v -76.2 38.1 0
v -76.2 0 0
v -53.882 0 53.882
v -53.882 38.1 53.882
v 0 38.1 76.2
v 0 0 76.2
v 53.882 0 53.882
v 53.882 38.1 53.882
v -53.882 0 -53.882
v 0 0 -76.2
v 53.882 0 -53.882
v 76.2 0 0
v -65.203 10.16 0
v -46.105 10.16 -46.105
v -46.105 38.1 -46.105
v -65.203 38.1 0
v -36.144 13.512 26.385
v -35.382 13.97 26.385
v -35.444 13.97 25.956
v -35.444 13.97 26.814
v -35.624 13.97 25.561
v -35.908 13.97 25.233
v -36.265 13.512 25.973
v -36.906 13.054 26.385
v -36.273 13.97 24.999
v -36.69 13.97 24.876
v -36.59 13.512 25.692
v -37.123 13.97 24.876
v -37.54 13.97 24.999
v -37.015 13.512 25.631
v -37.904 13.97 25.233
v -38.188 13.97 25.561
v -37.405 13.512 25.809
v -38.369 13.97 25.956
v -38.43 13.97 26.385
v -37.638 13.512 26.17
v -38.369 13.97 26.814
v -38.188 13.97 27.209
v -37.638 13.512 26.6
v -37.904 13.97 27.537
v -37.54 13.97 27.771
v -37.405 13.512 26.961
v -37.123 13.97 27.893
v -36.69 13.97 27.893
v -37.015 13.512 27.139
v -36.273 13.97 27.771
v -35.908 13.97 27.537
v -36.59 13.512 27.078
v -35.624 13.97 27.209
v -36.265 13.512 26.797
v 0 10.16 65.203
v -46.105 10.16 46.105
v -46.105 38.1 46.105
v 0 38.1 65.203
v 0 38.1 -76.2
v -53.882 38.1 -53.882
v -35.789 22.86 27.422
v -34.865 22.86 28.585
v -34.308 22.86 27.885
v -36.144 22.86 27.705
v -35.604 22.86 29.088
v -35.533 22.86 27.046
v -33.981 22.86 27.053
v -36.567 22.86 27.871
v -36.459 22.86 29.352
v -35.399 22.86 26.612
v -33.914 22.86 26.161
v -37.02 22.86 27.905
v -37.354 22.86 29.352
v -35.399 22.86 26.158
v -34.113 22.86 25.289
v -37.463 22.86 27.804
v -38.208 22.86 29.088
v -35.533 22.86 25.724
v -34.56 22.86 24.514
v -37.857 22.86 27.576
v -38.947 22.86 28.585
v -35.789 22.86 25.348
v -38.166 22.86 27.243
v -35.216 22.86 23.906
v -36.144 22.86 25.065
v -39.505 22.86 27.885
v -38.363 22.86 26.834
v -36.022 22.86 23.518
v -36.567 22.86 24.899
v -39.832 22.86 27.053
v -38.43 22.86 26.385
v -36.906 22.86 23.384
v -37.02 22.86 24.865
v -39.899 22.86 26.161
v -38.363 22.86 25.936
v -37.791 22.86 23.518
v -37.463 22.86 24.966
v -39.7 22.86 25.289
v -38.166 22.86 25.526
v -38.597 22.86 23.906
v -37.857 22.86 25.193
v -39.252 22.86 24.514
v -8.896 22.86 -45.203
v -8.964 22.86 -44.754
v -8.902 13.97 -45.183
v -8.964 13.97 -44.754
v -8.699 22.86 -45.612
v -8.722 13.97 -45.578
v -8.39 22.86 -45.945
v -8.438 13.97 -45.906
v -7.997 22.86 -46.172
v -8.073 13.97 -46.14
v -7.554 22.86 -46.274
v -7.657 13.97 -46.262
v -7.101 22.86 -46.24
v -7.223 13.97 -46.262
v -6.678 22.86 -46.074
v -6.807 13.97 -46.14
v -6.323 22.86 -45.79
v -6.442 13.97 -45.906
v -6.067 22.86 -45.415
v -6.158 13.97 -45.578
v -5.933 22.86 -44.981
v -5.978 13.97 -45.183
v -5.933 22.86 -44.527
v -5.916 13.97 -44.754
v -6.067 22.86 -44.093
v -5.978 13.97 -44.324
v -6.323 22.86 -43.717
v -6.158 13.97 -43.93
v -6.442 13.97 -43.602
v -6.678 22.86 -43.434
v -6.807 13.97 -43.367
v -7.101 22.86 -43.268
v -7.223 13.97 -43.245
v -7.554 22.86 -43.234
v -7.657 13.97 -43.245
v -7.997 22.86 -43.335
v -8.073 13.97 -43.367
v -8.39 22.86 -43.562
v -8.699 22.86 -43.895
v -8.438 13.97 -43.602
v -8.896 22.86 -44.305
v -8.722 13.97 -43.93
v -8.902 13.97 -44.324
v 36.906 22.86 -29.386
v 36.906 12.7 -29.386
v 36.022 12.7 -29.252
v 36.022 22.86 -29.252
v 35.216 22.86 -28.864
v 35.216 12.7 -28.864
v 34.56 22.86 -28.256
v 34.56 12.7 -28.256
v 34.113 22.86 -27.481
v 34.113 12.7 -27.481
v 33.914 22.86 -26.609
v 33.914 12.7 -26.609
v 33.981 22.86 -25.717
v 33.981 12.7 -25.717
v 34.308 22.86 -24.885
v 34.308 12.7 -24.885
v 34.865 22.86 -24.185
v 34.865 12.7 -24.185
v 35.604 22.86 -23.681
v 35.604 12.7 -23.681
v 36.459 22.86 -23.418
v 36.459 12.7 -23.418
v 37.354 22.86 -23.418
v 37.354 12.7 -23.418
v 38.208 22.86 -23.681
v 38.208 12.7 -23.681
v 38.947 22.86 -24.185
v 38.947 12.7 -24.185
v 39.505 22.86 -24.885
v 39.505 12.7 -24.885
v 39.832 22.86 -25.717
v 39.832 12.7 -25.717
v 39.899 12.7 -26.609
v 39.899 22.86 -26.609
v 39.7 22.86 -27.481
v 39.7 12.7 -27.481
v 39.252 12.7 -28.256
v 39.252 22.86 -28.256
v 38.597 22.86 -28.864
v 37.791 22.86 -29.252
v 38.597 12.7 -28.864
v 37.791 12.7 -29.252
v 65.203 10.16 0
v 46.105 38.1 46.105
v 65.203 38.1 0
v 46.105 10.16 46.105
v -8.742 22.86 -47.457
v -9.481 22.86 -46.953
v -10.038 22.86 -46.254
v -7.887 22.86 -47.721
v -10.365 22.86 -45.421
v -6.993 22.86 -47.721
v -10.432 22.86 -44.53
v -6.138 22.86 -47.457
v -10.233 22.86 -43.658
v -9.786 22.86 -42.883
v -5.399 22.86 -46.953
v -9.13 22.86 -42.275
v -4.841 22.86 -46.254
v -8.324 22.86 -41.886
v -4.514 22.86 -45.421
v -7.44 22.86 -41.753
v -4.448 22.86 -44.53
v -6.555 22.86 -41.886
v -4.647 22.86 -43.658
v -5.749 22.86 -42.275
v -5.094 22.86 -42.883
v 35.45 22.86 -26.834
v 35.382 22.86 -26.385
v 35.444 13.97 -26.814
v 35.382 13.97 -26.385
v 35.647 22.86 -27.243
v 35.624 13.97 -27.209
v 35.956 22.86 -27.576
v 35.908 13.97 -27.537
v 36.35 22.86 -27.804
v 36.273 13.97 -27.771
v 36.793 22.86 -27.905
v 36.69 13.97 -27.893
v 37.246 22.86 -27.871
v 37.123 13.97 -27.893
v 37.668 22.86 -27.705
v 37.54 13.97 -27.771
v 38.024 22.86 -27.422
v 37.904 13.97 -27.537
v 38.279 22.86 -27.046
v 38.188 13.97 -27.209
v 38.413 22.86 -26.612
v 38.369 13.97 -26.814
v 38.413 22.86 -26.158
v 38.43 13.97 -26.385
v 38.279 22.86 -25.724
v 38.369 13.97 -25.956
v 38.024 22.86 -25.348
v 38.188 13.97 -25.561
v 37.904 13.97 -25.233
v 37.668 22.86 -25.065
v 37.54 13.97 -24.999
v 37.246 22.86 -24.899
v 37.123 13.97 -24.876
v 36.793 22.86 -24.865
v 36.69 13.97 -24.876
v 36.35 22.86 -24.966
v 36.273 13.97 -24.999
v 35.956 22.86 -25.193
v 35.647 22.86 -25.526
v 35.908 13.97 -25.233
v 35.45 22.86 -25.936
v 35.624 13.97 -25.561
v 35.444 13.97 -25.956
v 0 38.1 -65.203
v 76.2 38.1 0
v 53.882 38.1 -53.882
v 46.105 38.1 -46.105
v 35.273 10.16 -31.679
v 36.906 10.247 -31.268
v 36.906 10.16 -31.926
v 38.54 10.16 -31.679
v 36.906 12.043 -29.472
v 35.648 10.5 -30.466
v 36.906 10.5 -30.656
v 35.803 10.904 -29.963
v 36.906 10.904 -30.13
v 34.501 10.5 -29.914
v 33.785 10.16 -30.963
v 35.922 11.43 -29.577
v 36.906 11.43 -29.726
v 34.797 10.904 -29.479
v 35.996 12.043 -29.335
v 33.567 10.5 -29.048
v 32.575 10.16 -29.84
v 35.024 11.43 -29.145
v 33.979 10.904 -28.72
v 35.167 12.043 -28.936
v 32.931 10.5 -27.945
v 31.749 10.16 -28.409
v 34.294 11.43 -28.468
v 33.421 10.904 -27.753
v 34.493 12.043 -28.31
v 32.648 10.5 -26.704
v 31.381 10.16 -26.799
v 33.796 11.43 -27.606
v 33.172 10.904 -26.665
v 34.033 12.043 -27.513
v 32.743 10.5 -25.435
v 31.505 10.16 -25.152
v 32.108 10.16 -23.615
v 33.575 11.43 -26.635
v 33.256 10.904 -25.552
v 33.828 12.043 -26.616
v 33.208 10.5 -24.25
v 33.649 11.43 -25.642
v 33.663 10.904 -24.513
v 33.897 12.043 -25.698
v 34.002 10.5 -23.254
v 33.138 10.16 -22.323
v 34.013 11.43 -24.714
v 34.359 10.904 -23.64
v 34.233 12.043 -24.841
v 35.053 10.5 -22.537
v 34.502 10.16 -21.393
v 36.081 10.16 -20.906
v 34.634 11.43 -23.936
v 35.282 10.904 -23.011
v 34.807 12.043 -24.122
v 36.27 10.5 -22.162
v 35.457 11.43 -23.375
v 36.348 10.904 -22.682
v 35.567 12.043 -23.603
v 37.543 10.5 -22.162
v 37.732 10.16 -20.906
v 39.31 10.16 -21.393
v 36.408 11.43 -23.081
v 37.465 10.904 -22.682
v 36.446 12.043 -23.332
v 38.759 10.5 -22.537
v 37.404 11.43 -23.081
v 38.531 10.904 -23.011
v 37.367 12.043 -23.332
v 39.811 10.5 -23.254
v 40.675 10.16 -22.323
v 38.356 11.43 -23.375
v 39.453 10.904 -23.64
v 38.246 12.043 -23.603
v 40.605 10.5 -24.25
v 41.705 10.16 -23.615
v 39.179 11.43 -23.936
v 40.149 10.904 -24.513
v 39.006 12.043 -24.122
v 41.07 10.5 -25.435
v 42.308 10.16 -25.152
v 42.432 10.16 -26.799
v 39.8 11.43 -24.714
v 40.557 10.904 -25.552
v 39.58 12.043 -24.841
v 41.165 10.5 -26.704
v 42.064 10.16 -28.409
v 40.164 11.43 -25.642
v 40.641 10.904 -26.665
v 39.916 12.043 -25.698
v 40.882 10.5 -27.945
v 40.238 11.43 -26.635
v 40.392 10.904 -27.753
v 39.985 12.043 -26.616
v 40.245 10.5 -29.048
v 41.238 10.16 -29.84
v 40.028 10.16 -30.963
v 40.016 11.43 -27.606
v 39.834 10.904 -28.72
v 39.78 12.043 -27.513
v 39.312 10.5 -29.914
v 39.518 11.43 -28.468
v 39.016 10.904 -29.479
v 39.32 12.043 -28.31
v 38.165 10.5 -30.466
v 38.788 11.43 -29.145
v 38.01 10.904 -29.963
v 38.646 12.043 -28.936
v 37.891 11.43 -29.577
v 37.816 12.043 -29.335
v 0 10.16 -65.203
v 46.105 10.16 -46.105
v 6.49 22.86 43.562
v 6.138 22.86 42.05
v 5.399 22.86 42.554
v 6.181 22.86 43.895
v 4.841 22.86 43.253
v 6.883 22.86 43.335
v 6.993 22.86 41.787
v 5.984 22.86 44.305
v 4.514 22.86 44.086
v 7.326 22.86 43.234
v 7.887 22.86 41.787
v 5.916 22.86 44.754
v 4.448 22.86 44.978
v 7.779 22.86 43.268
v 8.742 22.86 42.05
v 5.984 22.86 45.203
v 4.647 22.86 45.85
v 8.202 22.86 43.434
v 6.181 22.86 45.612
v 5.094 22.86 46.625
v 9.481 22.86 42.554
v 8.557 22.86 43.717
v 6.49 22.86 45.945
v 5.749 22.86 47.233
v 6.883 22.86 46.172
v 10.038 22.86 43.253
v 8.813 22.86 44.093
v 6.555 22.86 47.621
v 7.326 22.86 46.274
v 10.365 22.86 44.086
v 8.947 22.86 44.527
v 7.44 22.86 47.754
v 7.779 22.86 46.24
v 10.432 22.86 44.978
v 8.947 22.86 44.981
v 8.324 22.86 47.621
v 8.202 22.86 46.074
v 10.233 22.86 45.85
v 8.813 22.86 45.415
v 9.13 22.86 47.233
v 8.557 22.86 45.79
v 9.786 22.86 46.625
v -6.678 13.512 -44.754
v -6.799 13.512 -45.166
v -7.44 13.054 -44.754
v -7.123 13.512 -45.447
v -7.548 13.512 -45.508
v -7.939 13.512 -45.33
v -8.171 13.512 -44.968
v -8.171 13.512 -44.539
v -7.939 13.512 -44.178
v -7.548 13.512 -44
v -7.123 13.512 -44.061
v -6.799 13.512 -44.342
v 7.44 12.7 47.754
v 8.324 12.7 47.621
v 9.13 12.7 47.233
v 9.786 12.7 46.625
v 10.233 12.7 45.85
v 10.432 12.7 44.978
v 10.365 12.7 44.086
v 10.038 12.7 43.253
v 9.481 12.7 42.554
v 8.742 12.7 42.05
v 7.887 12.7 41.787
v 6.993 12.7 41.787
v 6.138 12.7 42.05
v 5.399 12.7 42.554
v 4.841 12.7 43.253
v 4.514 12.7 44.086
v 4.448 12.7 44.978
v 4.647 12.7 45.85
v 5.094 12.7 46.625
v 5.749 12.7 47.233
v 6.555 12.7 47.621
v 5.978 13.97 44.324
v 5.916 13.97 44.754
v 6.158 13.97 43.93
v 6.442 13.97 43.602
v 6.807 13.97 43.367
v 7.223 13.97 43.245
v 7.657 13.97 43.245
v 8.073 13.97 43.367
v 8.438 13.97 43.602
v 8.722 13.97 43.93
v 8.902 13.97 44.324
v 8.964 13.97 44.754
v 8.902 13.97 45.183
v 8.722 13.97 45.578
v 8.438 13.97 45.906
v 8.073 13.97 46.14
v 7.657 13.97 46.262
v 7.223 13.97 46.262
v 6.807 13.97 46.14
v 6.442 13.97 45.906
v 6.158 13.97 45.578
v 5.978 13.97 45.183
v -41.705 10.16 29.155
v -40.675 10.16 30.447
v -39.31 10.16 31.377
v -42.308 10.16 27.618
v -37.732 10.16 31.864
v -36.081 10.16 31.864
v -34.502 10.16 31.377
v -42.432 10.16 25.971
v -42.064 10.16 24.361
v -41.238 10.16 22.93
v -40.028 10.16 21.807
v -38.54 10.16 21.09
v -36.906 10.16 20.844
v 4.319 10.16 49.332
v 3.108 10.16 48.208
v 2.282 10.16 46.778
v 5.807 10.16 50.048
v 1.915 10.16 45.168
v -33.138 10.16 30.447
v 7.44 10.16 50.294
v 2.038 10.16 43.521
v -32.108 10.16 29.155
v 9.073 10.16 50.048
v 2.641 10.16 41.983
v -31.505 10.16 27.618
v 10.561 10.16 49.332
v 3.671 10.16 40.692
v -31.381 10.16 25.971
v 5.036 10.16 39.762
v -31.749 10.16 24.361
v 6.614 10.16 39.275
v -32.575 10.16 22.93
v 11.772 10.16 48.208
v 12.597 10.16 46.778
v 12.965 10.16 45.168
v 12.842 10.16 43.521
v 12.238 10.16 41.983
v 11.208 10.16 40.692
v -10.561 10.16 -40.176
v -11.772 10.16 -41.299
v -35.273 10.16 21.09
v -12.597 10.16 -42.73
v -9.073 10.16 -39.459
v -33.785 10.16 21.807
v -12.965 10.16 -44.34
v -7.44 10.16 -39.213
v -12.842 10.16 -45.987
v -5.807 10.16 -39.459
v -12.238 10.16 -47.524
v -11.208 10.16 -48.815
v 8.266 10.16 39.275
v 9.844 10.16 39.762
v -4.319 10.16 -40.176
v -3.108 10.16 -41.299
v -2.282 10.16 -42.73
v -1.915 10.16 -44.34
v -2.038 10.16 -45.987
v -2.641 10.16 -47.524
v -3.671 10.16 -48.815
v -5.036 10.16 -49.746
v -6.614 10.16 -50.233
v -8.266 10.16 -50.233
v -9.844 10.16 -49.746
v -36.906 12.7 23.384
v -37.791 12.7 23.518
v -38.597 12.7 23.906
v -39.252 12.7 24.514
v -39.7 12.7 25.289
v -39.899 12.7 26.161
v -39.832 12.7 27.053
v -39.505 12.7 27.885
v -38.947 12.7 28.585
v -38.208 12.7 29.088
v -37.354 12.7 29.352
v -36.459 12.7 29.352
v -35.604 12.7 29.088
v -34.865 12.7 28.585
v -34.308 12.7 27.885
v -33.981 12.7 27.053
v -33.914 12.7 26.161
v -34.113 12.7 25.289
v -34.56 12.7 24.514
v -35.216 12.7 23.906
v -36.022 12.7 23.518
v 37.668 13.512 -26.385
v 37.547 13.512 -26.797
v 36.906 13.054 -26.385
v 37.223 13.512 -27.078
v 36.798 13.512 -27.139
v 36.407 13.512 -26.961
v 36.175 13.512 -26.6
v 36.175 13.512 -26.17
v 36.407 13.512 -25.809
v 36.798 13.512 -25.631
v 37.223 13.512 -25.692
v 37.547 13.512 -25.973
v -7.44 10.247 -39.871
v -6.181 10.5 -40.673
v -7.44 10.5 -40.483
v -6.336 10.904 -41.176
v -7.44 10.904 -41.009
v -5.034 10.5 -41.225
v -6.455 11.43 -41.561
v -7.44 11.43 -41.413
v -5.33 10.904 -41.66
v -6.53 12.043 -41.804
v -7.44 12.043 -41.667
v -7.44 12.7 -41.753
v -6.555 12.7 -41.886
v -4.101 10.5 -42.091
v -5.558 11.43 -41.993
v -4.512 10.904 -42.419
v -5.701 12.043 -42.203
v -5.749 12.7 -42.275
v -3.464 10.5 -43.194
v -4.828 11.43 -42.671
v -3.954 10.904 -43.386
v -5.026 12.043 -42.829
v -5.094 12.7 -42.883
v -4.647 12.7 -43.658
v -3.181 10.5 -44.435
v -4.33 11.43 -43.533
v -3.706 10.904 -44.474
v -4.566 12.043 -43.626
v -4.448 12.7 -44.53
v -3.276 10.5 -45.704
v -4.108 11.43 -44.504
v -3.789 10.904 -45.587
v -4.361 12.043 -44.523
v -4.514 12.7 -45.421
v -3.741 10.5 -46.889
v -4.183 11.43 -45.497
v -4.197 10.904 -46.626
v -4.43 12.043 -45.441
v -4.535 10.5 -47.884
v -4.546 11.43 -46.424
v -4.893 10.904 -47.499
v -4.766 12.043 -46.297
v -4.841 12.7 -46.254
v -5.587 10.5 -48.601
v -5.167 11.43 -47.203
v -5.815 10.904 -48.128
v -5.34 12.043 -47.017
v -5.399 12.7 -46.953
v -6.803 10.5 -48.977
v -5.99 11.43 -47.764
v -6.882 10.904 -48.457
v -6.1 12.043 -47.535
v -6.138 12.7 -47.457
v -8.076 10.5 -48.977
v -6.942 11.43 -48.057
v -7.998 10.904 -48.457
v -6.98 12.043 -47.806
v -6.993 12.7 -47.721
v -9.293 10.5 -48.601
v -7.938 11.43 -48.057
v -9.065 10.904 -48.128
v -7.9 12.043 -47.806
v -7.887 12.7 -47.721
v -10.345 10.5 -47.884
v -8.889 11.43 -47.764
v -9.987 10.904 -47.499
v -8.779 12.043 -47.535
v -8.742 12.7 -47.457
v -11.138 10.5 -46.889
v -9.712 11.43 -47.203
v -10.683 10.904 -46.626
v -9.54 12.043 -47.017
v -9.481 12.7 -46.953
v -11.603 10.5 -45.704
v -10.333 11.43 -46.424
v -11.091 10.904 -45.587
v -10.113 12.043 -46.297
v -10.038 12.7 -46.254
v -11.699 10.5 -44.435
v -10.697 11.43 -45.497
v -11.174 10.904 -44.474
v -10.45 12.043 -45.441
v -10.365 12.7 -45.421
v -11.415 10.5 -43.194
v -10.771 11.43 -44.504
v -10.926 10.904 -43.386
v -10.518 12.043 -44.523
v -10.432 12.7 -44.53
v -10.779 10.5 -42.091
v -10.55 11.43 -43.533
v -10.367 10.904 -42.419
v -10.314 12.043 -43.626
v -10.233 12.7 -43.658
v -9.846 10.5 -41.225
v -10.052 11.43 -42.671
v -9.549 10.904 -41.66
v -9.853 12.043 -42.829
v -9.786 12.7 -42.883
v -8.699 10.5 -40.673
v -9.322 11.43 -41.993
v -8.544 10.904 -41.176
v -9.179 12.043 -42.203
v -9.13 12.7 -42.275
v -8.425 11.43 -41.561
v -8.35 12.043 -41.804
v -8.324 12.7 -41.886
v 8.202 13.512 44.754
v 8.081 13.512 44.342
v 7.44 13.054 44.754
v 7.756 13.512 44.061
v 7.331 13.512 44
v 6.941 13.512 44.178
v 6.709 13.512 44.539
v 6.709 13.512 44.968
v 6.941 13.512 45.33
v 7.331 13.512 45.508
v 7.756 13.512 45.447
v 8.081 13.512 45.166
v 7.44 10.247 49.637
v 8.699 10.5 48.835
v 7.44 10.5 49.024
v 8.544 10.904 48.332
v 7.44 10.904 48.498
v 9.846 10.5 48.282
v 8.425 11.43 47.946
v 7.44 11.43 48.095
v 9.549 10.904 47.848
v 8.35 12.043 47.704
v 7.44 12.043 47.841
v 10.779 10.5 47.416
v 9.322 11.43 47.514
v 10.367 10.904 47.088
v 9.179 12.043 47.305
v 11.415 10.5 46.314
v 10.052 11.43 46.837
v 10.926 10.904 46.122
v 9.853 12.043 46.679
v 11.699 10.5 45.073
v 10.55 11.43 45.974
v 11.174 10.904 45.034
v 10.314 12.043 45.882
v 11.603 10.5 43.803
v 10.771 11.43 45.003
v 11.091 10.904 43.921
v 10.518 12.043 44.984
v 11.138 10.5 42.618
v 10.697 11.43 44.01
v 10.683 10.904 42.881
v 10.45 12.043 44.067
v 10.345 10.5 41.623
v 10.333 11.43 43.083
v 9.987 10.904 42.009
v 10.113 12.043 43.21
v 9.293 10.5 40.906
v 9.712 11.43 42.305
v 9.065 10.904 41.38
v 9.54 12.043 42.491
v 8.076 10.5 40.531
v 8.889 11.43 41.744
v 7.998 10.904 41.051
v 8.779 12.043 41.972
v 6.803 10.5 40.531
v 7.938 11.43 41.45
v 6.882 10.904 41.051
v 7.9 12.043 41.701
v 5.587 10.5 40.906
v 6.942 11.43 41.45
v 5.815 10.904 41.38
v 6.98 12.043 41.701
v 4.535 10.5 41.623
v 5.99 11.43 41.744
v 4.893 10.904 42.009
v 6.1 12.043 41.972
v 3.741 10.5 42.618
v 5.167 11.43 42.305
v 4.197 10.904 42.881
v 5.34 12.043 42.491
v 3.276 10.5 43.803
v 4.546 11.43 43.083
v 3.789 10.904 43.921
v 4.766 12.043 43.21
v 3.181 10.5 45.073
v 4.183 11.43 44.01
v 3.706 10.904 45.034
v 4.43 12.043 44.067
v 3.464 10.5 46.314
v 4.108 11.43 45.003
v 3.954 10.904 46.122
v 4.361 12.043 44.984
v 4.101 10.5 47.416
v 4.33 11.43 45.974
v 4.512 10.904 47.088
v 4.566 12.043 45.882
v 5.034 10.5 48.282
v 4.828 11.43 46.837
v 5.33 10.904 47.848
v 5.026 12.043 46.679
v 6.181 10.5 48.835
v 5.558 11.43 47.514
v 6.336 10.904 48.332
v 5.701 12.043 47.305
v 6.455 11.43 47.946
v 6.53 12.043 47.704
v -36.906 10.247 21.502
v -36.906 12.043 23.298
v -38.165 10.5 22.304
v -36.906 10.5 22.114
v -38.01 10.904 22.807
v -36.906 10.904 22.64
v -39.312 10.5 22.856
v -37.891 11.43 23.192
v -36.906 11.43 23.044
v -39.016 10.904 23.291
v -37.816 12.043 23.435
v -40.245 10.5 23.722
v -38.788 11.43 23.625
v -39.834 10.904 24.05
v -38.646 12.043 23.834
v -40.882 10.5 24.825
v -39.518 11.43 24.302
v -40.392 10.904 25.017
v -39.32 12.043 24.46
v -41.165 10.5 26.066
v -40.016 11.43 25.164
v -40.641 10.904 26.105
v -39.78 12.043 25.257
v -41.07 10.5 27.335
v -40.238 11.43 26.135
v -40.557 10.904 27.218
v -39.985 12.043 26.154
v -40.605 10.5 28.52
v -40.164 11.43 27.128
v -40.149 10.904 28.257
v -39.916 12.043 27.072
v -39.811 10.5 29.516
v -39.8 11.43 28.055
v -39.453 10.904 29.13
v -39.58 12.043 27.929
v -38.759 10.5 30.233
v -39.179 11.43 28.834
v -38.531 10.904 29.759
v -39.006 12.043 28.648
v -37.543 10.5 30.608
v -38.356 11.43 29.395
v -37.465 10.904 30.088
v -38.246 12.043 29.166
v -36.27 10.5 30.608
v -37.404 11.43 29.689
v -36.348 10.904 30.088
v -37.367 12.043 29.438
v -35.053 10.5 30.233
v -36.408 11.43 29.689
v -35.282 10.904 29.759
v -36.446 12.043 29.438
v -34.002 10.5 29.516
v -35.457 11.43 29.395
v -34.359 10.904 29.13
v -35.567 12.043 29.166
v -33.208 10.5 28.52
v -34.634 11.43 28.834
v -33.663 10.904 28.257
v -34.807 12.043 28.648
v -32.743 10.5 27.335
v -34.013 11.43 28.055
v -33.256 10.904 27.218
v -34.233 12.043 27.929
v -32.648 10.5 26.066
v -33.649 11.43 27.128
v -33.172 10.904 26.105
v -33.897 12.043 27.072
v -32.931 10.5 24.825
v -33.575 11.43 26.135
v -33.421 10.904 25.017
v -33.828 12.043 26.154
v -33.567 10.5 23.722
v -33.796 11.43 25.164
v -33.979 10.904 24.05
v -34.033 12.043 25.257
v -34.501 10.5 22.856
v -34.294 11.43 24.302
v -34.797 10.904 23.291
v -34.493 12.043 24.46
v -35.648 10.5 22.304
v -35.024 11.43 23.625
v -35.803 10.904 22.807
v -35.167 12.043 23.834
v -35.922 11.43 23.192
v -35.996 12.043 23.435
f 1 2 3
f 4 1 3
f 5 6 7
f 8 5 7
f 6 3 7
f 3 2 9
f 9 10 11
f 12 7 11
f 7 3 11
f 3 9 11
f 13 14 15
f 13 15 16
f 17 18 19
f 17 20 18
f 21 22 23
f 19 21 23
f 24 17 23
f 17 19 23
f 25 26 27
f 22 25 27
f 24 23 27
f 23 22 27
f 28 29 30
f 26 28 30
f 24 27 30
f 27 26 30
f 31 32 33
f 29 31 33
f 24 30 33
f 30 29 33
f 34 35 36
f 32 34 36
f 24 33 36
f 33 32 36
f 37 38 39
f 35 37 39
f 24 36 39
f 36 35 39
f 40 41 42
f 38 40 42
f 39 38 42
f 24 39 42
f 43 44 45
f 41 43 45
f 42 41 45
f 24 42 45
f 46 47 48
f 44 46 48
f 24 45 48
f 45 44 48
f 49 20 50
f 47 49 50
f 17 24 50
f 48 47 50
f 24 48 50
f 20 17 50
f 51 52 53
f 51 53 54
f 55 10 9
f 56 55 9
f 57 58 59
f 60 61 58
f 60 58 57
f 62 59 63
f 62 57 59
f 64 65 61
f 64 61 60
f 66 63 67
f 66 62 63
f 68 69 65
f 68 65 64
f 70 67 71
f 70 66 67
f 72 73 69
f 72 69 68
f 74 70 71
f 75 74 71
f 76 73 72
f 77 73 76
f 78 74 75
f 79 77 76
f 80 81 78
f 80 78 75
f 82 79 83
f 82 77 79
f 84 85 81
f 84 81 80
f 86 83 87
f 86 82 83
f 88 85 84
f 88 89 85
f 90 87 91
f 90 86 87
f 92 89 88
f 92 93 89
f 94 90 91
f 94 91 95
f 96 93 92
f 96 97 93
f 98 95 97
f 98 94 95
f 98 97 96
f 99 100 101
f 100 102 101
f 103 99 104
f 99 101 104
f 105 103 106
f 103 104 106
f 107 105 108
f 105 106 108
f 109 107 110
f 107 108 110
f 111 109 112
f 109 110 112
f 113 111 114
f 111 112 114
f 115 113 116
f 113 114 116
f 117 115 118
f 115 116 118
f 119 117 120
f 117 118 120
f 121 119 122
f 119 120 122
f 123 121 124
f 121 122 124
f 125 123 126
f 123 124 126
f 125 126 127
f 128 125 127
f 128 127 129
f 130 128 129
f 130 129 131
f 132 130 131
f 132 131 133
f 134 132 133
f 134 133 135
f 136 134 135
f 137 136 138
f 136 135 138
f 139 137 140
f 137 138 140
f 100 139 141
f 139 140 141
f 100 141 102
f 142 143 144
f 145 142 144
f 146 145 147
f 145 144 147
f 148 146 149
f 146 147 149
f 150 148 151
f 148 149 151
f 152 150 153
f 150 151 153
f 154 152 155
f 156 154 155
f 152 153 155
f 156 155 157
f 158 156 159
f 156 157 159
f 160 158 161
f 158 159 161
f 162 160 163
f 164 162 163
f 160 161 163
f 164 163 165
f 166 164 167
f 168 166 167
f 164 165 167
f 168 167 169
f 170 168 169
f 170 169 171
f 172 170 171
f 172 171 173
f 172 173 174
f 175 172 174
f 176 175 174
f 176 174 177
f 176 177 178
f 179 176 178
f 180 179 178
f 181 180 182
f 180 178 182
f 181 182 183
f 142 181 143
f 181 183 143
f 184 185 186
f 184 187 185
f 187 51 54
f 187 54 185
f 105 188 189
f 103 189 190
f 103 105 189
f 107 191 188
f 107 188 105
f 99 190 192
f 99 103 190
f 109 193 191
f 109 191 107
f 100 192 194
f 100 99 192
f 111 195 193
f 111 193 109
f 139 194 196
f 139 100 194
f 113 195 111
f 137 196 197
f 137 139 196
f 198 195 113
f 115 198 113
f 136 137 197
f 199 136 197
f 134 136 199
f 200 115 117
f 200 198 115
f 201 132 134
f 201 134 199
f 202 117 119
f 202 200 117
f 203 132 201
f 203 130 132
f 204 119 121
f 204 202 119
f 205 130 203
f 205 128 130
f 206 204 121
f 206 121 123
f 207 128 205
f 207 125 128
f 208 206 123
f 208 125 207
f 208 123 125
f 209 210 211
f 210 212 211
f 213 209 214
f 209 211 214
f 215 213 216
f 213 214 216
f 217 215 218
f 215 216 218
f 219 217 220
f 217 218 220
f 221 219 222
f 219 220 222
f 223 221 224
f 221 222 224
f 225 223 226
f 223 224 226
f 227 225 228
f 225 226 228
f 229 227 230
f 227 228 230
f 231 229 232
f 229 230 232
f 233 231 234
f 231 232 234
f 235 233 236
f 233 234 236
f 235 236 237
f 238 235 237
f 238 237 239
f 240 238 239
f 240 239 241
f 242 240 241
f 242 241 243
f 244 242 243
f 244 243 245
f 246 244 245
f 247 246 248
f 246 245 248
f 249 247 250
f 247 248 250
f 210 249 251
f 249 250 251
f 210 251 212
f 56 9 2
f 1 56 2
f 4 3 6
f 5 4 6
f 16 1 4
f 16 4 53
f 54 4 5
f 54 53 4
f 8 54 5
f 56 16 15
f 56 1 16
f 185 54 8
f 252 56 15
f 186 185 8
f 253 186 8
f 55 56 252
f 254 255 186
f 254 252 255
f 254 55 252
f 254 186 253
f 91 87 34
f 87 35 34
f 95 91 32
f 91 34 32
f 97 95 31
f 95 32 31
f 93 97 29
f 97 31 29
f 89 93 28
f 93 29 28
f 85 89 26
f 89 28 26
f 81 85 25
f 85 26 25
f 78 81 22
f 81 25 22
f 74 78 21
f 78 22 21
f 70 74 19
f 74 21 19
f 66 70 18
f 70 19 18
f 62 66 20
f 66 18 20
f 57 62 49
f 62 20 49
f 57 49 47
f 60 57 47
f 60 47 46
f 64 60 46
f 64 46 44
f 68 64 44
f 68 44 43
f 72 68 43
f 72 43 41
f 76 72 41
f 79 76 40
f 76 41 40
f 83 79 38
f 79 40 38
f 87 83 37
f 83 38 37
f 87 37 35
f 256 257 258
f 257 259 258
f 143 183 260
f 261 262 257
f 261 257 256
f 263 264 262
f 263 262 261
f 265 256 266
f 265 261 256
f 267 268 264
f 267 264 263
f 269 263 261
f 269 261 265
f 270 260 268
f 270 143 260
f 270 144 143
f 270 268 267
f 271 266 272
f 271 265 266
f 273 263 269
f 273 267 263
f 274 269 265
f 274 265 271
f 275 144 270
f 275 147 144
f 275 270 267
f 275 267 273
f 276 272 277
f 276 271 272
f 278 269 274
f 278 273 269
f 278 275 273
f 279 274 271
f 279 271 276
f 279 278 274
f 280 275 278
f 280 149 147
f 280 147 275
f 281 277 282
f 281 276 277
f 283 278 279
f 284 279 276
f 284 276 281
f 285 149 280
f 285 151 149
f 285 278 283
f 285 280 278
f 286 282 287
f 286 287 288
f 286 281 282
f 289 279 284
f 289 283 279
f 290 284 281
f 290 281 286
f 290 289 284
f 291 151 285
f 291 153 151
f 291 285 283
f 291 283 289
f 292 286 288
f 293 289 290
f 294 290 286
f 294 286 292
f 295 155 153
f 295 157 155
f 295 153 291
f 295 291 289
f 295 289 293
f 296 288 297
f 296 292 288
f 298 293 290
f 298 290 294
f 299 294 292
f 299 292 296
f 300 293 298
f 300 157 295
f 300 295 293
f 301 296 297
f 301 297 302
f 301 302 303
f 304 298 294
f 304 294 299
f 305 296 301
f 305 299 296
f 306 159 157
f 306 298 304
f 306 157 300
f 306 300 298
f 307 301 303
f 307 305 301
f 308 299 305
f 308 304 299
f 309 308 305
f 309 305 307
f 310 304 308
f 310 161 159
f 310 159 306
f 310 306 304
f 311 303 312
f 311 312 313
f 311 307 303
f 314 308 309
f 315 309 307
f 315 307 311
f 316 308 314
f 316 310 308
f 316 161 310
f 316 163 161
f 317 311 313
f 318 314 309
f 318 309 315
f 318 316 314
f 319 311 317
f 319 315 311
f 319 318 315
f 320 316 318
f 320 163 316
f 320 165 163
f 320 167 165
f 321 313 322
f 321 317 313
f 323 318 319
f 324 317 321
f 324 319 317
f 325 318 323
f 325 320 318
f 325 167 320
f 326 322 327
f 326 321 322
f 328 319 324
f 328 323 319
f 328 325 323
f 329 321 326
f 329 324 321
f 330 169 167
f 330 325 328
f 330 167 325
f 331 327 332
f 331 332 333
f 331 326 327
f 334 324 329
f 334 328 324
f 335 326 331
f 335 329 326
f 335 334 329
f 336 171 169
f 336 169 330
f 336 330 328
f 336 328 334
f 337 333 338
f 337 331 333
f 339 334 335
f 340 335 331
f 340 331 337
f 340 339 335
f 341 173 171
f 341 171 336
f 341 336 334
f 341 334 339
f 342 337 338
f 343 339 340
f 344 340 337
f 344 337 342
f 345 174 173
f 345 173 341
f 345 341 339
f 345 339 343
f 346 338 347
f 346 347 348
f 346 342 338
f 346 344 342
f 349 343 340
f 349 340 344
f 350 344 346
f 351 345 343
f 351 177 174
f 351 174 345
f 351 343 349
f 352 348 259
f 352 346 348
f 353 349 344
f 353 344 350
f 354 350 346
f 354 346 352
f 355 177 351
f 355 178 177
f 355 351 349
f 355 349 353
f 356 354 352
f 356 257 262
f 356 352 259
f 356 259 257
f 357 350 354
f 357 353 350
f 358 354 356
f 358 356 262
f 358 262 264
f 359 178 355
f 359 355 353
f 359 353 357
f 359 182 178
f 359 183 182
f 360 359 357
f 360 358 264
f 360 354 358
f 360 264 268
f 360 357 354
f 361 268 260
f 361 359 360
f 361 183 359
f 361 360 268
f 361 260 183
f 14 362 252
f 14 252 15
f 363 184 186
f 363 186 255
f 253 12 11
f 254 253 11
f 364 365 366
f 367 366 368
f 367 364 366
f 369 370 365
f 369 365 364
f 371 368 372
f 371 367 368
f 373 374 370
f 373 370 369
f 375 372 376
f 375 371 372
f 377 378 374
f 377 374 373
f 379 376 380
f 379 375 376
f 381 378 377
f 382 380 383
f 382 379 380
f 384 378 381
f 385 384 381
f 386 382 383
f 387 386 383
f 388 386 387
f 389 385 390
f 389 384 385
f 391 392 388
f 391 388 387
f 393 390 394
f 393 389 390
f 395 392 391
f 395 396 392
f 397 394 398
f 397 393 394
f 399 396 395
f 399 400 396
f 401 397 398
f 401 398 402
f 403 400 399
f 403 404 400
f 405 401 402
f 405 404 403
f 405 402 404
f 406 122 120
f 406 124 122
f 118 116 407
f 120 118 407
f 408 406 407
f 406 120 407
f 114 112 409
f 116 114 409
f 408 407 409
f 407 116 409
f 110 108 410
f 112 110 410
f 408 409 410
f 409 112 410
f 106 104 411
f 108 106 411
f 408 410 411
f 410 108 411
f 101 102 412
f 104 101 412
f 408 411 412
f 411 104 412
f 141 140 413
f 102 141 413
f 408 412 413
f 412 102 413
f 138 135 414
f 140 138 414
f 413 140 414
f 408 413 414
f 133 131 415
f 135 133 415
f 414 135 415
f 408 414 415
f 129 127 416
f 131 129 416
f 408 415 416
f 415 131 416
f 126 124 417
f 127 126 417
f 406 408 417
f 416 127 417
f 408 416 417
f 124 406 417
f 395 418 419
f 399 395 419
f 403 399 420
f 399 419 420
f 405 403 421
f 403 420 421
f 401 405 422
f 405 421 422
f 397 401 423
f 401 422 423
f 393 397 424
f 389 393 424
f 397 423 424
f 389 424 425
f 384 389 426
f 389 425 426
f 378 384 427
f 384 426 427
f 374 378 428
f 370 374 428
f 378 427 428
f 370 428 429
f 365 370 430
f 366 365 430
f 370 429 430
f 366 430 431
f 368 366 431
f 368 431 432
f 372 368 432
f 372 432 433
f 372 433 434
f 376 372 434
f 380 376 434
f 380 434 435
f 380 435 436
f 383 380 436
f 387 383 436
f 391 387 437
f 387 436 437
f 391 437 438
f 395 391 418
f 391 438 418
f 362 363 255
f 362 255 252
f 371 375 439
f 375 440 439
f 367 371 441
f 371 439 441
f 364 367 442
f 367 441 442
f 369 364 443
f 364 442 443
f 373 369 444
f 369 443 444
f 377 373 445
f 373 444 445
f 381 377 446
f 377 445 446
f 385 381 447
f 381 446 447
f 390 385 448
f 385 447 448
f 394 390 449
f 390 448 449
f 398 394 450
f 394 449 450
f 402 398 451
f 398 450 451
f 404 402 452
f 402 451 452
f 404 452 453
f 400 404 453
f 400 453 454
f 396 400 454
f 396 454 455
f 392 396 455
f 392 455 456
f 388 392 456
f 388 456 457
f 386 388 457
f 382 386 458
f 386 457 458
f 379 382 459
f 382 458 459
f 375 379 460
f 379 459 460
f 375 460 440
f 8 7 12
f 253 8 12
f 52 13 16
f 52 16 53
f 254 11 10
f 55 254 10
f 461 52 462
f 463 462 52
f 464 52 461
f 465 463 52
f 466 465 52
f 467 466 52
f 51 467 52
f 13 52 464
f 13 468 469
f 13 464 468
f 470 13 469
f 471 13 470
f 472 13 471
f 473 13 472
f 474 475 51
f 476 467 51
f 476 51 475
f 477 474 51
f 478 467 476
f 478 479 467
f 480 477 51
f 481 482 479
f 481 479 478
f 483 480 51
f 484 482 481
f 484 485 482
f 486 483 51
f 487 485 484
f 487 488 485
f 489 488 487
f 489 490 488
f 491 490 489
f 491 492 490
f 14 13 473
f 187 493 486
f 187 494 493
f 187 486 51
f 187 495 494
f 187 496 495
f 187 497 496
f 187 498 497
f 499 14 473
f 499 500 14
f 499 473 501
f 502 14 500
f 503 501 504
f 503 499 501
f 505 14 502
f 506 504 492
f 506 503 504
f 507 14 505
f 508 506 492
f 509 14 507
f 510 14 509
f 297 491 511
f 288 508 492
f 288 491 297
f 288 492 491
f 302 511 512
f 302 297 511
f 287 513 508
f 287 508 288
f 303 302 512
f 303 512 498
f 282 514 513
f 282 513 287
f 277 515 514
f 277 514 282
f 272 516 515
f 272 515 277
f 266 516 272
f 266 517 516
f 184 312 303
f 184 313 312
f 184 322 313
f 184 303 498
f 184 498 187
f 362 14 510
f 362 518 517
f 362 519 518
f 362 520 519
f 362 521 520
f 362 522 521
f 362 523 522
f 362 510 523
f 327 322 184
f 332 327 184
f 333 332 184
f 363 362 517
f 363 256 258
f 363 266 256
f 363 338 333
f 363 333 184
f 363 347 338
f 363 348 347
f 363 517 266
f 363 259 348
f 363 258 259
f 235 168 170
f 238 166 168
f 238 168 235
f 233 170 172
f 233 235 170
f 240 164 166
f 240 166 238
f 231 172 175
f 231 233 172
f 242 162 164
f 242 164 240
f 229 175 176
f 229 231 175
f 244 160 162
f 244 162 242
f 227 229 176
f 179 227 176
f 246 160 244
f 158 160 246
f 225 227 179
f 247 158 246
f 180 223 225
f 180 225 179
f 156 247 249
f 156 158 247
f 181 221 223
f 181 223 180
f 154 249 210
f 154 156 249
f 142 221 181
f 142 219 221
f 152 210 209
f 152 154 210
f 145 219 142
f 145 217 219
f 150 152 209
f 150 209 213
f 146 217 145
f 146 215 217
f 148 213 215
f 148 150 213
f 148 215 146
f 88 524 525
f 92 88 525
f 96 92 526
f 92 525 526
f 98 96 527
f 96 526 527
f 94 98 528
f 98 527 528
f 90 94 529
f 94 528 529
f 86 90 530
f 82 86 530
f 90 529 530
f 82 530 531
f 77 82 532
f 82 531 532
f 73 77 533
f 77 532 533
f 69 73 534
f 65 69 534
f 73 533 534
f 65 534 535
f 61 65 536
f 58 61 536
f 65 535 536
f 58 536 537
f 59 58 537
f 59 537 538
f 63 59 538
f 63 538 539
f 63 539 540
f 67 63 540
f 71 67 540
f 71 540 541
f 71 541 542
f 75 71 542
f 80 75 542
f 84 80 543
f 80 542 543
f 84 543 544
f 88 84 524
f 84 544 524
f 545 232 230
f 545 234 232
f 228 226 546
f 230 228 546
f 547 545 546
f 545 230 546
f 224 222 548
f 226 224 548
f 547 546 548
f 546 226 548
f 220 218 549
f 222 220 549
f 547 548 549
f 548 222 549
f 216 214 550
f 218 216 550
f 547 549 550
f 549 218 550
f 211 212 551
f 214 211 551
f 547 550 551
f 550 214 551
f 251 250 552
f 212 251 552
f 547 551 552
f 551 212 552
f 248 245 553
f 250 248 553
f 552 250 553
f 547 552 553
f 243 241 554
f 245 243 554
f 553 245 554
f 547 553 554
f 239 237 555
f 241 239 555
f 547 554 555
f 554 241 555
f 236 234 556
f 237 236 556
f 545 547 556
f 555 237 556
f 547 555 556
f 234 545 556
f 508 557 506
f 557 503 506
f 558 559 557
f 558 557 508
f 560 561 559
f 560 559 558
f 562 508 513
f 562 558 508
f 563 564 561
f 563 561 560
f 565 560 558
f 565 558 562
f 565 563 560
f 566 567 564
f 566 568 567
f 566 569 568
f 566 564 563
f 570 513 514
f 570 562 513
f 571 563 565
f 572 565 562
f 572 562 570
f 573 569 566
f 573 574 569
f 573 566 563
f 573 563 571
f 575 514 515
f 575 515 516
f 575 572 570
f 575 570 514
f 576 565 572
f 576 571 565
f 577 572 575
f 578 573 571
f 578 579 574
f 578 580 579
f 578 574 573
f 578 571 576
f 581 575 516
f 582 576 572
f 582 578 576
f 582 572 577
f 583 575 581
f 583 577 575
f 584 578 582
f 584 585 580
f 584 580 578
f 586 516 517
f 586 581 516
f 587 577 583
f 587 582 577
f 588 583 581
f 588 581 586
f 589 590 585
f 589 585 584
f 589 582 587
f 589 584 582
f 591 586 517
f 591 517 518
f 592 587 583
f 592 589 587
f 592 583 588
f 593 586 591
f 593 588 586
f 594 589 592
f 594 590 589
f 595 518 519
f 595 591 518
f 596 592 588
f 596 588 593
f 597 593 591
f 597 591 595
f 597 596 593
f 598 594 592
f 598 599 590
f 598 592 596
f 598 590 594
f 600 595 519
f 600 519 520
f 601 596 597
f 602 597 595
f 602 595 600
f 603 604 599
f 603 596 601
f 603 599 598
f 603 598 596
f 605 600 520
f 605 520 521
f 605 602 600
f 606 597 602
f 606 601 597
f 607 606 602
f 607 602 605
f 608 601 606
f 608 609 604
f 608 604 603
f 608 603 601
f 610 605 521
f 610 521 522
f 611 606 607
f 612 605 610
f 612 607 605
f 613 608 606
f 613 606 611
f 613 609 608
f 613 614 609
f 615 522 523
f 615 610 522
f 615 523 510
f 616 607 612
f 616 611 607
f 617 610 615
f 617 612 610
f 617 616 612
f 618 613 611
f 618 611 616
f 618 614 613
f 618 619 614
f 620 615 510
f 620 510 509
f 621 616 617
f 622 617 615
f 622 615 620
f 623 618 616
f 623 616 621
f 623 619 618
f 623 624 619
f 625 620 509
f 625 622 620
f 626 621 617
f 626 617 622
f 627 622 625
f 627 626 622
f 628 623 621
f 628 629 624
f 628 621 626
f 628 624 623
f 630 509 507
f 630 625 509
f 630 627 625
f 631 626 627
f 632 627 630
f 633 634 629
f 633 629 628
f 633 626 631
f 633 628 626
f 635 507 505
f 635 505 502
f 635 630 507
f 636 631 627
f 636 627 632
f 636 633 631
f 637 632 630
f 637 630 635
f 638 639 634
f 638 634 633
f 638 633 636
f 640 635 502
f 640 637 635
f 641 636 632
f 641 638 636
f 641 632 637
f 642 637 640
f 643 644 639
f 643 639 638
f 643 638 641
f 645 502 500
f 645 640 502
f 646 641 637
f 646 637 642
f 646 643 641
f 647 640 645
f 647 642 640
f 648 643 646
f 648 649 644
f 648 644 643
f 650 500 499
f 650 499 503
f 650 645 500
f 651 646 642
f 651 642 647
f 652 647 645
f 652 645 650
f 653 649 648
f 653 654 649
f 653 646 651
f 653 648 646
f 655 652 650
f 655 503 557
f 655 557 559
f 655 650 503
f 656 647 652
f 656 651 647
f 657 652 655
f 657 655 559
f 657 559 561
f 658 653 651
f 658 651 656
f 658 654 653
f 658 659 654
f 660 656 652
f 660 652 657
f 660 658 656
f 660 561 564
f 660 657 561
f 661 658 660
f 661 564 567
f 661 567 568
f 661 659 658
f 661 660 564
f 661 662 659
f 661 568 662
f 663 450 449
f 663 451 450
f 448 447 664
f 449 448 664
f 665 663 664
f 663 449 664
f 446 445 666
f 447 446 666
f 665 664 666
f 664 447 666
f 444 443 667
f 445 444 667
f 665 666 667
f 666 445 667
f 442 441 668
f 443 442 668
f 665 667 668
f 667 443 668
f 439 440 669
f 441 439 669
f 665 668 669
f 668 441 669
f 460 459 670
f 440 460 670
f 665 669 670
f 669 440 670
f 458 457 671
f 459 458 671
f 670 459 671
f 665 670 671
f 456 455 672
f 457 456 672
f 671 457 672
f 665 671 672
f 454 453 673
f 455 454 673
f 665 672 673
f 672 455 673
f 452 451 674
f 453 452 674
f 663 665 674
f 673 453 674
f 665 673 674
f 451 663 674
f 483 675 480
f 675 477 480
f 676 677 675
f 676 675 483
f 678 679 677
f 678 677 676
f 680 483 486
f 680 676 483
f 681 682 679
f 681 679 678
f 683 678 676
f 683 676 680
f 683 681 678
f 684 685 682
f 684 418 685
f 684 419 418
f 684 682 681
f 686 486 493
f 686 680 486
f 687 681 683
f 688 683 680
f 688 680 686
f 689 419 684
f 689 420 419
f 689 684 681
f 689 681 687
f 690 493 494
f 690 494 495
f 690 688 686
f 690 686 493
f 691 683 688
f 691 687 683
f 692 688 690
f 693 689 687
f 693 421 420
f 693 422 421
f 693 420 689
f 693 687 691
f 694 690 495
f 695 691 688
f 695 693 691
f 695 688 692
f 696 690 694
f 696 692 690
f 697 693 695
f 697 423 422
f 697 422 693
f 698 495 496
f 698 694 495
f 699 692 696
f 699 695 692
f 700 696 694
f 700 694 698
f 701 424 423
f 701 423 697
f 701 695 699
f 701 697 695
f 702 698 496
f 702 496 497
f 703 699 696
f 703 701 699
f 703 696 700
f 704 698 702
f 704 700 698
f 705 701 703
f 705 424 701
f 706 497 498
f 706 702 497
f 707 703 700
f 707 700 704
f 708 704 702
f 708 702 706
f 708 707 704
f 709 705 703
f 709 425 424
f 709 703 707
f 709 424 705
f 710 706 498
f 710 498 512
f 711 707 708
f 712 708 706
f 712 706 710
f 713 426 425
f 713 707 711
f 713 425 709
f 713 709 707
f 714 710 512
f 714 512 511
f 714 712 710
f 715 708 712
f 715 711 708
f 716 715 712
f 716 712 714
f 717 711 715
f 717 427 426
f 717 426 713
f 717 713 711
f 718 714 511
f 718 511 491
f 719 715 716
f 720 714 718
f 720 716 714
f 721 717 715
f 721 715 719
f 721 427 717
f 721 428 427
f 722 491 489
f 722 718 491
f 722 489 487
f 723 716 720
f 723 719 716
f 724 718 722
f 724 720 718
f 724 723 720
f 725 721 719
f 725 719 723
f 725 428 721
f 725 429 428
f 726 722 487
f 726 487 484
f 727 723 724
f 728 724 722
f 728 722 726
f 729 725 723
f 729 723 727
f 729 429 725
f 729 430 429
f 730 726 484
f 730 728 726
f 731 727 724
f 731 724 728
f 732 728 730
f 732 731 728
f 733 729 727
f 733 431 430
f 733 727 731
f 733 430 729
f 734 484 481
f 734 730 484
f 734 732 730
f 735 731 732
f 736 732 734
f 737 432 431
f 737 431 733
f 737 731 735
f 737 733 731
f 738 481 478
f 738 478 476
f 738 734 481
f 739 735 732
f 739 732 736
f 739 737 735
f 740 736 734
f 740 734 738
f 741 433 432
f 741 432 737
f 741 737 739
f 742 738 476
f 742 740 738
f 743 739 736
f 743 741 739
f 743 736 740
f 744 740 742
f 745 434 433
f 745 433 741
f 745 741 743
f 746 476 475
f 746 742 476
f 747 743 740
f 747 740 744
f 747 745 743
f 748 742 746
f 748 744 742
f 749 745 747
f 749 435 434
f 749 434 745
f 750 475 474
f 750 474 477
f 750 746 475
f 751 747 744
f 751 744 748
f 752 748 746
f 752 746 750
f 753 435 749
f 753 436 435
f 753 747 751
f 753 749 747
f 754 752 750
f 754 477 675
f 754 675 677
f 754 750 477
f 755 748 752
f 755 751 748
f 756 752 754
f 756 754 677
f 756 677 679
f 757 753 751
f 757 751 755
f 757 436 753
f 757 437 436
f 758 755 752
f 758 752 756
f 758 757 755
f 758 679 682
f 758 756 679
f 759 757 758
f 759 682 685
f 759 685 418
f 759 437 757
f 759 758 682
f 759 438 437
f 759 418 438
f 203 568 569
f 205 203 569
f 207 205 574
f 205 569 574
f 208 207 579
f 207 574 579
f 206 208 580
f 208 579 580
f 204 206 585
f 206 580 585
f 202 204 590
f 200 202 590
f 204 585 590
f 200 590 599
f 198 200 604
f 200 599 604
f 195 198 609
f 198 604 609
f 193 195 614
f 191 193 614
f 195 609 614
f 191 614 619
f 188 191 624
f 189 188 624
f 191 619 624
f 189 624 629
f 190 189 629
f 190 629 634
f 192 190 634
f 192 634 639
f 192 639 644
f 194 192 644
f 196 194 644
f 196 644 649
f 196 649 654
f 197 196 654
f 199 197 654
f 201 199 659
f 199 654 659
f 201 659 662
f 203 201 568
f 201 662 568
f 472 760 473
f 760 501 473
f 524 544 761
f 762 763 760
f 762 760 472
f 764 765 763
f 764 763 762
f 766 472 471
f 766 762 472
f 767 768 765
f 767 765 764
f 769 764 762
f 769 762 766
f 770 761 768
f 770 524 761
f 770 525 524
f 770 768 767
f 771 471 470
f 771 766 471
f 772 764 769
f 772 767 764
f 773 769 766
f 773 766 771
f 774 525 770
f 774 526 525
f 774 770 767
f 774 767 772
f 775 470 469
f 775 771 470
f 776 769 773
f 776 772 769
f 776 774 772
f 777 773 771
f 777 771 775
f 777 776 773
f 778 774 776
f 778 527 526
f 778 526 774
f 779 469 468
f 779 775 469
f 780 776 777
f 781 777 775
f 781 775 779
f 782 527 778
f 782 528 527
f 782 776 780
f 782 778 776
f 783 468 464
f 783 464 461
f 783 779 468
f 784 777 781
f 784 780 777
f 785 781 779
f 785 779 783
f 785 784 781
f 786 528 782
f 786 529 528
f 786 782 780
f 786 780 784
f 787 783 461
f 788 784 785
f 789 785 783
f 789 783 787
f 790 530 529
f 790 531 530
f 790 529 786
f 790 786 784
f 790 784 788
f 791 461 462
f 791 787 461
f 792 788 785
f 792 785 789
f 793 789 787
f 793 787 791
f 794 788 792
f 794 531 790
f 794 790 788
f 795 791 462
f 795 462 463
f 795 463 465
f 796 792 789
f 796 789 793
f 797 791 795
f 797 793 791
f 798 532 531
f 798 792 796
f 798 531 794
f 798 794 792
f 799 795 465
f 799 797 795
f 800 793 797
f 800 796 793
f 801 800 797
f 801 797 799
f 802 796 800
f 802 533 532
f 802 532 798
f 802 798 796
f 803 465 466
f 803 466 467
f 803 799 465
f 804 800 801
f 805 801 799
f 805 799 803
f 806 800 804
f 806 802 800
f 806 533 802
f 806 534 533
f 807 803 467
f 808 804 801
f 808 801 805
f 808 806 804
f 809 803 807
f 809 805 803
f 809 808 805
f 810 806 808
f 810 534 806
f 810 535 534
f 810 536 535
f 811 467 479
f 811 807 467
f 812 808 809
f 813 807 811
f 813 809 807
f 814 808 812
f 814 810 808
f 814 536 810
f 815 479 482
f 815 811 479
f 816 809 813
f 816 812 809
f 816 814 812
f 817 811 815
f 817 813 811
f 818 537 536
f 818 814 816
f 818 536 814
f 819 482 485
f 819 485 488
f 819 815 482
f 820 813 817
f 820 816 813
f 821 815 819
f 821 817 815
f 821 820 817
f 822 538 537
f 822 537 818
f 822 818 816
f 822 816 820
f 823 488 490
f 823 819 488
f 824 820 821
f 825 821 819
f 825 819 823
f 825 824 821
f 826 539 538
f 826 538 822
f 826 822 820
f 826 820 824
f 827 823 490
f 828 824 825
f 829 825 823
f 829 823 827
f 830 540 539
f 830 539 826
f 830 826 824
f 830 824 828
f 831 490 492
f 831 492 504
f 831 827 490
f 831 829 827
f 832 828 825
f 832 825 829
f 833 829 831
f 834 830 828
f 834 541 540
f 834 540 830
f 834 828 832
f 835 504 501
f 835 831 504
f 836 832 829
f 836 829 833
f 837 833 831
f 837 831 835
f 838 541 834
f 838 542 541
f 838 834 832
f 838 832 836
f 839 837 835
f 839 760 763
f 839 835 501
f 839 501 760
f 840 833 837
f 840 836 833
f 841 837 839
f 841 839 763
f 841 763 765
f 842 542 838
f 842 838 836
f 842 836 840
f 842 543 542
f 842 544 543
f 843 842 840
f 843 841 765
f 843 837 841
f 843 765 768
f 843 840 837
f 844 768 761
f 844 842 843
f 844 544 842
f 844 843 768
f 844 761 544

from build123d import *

# Parameters (mm, degrees)
BOSS_EXTRUDE1_DEPTH             = 38.1
SHELL1_T                        = -10.16
SKETCH5_R                       = 3.000653817
BOSS_EXTRUDE2_DEPTH             = 12.7
FILLET2_R                       = 2.54
TAP_DRILL_FOR_4_HELICOIL2_D     = 3.048
TAP_DRILL_FOR_4_HELICOIL2_DEPTH = 8.89
TAP_DRILL_FOR_4_HELICOIL2_TIP   = 0.915711583


with BuildPart() as part:
    # Sketch1 → Boss-Extrude1 (new body)
    with BuildSketch(Plane(origin=(0, 0, 0), x_dir=(1, 0, 0), z_dir=(0, 1, 0))):
        Polygon((76.2, 0), (53.881536726, 53.881536726), (0, 76.2), (-53.881536726, 53.881536726), (-76.2, 0), (-53.881536726, -53.881536726), (0, -76.2), (53.881536726, -53.881536726), align=None)
    extrude(amount=BOSS_EXTRUDE1_DEPTH)

    # Shell1
    shell1_openings = [part.faces().sort_by_distance(p)[0] for p in [
        (0, 38.1, 0),
    ]]
    offset(amount=SHELL1_T, openings=shell1_openings, kind=Kind.INTERSECTION)

    # Sketch5 → Boss-Extrude2 (add)
    with BuildSketch(Plane(origin=(0, 10.16, 0), x_dir=(1, 0, 0), z_dir=(0, 1, 0))):
        with Locations(Location((-7.439796634, 44.753764378, 0), (0, 0, 270))):
            Circle(SKETCH5_R)
        with Locations(Location((36.906420926, 26.384959625, 0), (0, 0, 90))):
            Circle(SKETCH5_R)
        with Locations(Location((7.439796634, -44.753764378, 0), (0, 0, 270))):
            Circle(SKETCH5_R)
        with Locations(Location((-36.906420926, -26.384959625, 0), (0, 0, 90))):
            Circle(SKETCH5_R)
    extrude(amount=BOSS_EXTRUDE2_DEPTH)

    # Fillet2
    fillet2_edges = [part.edges().sort_by_distance(p)[0] for p in [
        (-7.439796634, 10.16, -47.754418196),
        (36.906420926, 10.16, -23.384305808),
        (7.439796634, 10.16, 41.753110561),
        (-36.906420926, 10.16, 29.385613442),
    ]]
    fillet(fillet2_edges, radius=FILLET2_R)

    # Tap Drill for #4 Helicoil2
    with Locations(Plane(origin=(0, 22.86, 0), x_dir=(1, 0, 0), z_dir=(0, 1, 0))):
        with Locations((-7.439796634, 44.753764378), (36.906420926, 26.384959625), (7.439796634, -44.753764378), (-36.906420926, -26.384959625)):
            Hole(TAP_DRILL_FOR_4_HELICOIL2_D / 2, depth=TAP_DRILL_FOR_4_HELICOIL2_DEPTH)
            with Locations((0, 0, -(TAP_DRILL_FOR_4_HELICOIL2_DEPTH + TAP_DRILL_FOR_4_HELICOIL2_TIP / 2))):  # 118° drill point
                Cone(0, TAP_DRILL_FOR_4_HELICOIL2_D / 2, TAP_DRILL_FOR_4_HELICOIL2_TIP, mode=Mode.SUBTRACT)


solid = part.part
